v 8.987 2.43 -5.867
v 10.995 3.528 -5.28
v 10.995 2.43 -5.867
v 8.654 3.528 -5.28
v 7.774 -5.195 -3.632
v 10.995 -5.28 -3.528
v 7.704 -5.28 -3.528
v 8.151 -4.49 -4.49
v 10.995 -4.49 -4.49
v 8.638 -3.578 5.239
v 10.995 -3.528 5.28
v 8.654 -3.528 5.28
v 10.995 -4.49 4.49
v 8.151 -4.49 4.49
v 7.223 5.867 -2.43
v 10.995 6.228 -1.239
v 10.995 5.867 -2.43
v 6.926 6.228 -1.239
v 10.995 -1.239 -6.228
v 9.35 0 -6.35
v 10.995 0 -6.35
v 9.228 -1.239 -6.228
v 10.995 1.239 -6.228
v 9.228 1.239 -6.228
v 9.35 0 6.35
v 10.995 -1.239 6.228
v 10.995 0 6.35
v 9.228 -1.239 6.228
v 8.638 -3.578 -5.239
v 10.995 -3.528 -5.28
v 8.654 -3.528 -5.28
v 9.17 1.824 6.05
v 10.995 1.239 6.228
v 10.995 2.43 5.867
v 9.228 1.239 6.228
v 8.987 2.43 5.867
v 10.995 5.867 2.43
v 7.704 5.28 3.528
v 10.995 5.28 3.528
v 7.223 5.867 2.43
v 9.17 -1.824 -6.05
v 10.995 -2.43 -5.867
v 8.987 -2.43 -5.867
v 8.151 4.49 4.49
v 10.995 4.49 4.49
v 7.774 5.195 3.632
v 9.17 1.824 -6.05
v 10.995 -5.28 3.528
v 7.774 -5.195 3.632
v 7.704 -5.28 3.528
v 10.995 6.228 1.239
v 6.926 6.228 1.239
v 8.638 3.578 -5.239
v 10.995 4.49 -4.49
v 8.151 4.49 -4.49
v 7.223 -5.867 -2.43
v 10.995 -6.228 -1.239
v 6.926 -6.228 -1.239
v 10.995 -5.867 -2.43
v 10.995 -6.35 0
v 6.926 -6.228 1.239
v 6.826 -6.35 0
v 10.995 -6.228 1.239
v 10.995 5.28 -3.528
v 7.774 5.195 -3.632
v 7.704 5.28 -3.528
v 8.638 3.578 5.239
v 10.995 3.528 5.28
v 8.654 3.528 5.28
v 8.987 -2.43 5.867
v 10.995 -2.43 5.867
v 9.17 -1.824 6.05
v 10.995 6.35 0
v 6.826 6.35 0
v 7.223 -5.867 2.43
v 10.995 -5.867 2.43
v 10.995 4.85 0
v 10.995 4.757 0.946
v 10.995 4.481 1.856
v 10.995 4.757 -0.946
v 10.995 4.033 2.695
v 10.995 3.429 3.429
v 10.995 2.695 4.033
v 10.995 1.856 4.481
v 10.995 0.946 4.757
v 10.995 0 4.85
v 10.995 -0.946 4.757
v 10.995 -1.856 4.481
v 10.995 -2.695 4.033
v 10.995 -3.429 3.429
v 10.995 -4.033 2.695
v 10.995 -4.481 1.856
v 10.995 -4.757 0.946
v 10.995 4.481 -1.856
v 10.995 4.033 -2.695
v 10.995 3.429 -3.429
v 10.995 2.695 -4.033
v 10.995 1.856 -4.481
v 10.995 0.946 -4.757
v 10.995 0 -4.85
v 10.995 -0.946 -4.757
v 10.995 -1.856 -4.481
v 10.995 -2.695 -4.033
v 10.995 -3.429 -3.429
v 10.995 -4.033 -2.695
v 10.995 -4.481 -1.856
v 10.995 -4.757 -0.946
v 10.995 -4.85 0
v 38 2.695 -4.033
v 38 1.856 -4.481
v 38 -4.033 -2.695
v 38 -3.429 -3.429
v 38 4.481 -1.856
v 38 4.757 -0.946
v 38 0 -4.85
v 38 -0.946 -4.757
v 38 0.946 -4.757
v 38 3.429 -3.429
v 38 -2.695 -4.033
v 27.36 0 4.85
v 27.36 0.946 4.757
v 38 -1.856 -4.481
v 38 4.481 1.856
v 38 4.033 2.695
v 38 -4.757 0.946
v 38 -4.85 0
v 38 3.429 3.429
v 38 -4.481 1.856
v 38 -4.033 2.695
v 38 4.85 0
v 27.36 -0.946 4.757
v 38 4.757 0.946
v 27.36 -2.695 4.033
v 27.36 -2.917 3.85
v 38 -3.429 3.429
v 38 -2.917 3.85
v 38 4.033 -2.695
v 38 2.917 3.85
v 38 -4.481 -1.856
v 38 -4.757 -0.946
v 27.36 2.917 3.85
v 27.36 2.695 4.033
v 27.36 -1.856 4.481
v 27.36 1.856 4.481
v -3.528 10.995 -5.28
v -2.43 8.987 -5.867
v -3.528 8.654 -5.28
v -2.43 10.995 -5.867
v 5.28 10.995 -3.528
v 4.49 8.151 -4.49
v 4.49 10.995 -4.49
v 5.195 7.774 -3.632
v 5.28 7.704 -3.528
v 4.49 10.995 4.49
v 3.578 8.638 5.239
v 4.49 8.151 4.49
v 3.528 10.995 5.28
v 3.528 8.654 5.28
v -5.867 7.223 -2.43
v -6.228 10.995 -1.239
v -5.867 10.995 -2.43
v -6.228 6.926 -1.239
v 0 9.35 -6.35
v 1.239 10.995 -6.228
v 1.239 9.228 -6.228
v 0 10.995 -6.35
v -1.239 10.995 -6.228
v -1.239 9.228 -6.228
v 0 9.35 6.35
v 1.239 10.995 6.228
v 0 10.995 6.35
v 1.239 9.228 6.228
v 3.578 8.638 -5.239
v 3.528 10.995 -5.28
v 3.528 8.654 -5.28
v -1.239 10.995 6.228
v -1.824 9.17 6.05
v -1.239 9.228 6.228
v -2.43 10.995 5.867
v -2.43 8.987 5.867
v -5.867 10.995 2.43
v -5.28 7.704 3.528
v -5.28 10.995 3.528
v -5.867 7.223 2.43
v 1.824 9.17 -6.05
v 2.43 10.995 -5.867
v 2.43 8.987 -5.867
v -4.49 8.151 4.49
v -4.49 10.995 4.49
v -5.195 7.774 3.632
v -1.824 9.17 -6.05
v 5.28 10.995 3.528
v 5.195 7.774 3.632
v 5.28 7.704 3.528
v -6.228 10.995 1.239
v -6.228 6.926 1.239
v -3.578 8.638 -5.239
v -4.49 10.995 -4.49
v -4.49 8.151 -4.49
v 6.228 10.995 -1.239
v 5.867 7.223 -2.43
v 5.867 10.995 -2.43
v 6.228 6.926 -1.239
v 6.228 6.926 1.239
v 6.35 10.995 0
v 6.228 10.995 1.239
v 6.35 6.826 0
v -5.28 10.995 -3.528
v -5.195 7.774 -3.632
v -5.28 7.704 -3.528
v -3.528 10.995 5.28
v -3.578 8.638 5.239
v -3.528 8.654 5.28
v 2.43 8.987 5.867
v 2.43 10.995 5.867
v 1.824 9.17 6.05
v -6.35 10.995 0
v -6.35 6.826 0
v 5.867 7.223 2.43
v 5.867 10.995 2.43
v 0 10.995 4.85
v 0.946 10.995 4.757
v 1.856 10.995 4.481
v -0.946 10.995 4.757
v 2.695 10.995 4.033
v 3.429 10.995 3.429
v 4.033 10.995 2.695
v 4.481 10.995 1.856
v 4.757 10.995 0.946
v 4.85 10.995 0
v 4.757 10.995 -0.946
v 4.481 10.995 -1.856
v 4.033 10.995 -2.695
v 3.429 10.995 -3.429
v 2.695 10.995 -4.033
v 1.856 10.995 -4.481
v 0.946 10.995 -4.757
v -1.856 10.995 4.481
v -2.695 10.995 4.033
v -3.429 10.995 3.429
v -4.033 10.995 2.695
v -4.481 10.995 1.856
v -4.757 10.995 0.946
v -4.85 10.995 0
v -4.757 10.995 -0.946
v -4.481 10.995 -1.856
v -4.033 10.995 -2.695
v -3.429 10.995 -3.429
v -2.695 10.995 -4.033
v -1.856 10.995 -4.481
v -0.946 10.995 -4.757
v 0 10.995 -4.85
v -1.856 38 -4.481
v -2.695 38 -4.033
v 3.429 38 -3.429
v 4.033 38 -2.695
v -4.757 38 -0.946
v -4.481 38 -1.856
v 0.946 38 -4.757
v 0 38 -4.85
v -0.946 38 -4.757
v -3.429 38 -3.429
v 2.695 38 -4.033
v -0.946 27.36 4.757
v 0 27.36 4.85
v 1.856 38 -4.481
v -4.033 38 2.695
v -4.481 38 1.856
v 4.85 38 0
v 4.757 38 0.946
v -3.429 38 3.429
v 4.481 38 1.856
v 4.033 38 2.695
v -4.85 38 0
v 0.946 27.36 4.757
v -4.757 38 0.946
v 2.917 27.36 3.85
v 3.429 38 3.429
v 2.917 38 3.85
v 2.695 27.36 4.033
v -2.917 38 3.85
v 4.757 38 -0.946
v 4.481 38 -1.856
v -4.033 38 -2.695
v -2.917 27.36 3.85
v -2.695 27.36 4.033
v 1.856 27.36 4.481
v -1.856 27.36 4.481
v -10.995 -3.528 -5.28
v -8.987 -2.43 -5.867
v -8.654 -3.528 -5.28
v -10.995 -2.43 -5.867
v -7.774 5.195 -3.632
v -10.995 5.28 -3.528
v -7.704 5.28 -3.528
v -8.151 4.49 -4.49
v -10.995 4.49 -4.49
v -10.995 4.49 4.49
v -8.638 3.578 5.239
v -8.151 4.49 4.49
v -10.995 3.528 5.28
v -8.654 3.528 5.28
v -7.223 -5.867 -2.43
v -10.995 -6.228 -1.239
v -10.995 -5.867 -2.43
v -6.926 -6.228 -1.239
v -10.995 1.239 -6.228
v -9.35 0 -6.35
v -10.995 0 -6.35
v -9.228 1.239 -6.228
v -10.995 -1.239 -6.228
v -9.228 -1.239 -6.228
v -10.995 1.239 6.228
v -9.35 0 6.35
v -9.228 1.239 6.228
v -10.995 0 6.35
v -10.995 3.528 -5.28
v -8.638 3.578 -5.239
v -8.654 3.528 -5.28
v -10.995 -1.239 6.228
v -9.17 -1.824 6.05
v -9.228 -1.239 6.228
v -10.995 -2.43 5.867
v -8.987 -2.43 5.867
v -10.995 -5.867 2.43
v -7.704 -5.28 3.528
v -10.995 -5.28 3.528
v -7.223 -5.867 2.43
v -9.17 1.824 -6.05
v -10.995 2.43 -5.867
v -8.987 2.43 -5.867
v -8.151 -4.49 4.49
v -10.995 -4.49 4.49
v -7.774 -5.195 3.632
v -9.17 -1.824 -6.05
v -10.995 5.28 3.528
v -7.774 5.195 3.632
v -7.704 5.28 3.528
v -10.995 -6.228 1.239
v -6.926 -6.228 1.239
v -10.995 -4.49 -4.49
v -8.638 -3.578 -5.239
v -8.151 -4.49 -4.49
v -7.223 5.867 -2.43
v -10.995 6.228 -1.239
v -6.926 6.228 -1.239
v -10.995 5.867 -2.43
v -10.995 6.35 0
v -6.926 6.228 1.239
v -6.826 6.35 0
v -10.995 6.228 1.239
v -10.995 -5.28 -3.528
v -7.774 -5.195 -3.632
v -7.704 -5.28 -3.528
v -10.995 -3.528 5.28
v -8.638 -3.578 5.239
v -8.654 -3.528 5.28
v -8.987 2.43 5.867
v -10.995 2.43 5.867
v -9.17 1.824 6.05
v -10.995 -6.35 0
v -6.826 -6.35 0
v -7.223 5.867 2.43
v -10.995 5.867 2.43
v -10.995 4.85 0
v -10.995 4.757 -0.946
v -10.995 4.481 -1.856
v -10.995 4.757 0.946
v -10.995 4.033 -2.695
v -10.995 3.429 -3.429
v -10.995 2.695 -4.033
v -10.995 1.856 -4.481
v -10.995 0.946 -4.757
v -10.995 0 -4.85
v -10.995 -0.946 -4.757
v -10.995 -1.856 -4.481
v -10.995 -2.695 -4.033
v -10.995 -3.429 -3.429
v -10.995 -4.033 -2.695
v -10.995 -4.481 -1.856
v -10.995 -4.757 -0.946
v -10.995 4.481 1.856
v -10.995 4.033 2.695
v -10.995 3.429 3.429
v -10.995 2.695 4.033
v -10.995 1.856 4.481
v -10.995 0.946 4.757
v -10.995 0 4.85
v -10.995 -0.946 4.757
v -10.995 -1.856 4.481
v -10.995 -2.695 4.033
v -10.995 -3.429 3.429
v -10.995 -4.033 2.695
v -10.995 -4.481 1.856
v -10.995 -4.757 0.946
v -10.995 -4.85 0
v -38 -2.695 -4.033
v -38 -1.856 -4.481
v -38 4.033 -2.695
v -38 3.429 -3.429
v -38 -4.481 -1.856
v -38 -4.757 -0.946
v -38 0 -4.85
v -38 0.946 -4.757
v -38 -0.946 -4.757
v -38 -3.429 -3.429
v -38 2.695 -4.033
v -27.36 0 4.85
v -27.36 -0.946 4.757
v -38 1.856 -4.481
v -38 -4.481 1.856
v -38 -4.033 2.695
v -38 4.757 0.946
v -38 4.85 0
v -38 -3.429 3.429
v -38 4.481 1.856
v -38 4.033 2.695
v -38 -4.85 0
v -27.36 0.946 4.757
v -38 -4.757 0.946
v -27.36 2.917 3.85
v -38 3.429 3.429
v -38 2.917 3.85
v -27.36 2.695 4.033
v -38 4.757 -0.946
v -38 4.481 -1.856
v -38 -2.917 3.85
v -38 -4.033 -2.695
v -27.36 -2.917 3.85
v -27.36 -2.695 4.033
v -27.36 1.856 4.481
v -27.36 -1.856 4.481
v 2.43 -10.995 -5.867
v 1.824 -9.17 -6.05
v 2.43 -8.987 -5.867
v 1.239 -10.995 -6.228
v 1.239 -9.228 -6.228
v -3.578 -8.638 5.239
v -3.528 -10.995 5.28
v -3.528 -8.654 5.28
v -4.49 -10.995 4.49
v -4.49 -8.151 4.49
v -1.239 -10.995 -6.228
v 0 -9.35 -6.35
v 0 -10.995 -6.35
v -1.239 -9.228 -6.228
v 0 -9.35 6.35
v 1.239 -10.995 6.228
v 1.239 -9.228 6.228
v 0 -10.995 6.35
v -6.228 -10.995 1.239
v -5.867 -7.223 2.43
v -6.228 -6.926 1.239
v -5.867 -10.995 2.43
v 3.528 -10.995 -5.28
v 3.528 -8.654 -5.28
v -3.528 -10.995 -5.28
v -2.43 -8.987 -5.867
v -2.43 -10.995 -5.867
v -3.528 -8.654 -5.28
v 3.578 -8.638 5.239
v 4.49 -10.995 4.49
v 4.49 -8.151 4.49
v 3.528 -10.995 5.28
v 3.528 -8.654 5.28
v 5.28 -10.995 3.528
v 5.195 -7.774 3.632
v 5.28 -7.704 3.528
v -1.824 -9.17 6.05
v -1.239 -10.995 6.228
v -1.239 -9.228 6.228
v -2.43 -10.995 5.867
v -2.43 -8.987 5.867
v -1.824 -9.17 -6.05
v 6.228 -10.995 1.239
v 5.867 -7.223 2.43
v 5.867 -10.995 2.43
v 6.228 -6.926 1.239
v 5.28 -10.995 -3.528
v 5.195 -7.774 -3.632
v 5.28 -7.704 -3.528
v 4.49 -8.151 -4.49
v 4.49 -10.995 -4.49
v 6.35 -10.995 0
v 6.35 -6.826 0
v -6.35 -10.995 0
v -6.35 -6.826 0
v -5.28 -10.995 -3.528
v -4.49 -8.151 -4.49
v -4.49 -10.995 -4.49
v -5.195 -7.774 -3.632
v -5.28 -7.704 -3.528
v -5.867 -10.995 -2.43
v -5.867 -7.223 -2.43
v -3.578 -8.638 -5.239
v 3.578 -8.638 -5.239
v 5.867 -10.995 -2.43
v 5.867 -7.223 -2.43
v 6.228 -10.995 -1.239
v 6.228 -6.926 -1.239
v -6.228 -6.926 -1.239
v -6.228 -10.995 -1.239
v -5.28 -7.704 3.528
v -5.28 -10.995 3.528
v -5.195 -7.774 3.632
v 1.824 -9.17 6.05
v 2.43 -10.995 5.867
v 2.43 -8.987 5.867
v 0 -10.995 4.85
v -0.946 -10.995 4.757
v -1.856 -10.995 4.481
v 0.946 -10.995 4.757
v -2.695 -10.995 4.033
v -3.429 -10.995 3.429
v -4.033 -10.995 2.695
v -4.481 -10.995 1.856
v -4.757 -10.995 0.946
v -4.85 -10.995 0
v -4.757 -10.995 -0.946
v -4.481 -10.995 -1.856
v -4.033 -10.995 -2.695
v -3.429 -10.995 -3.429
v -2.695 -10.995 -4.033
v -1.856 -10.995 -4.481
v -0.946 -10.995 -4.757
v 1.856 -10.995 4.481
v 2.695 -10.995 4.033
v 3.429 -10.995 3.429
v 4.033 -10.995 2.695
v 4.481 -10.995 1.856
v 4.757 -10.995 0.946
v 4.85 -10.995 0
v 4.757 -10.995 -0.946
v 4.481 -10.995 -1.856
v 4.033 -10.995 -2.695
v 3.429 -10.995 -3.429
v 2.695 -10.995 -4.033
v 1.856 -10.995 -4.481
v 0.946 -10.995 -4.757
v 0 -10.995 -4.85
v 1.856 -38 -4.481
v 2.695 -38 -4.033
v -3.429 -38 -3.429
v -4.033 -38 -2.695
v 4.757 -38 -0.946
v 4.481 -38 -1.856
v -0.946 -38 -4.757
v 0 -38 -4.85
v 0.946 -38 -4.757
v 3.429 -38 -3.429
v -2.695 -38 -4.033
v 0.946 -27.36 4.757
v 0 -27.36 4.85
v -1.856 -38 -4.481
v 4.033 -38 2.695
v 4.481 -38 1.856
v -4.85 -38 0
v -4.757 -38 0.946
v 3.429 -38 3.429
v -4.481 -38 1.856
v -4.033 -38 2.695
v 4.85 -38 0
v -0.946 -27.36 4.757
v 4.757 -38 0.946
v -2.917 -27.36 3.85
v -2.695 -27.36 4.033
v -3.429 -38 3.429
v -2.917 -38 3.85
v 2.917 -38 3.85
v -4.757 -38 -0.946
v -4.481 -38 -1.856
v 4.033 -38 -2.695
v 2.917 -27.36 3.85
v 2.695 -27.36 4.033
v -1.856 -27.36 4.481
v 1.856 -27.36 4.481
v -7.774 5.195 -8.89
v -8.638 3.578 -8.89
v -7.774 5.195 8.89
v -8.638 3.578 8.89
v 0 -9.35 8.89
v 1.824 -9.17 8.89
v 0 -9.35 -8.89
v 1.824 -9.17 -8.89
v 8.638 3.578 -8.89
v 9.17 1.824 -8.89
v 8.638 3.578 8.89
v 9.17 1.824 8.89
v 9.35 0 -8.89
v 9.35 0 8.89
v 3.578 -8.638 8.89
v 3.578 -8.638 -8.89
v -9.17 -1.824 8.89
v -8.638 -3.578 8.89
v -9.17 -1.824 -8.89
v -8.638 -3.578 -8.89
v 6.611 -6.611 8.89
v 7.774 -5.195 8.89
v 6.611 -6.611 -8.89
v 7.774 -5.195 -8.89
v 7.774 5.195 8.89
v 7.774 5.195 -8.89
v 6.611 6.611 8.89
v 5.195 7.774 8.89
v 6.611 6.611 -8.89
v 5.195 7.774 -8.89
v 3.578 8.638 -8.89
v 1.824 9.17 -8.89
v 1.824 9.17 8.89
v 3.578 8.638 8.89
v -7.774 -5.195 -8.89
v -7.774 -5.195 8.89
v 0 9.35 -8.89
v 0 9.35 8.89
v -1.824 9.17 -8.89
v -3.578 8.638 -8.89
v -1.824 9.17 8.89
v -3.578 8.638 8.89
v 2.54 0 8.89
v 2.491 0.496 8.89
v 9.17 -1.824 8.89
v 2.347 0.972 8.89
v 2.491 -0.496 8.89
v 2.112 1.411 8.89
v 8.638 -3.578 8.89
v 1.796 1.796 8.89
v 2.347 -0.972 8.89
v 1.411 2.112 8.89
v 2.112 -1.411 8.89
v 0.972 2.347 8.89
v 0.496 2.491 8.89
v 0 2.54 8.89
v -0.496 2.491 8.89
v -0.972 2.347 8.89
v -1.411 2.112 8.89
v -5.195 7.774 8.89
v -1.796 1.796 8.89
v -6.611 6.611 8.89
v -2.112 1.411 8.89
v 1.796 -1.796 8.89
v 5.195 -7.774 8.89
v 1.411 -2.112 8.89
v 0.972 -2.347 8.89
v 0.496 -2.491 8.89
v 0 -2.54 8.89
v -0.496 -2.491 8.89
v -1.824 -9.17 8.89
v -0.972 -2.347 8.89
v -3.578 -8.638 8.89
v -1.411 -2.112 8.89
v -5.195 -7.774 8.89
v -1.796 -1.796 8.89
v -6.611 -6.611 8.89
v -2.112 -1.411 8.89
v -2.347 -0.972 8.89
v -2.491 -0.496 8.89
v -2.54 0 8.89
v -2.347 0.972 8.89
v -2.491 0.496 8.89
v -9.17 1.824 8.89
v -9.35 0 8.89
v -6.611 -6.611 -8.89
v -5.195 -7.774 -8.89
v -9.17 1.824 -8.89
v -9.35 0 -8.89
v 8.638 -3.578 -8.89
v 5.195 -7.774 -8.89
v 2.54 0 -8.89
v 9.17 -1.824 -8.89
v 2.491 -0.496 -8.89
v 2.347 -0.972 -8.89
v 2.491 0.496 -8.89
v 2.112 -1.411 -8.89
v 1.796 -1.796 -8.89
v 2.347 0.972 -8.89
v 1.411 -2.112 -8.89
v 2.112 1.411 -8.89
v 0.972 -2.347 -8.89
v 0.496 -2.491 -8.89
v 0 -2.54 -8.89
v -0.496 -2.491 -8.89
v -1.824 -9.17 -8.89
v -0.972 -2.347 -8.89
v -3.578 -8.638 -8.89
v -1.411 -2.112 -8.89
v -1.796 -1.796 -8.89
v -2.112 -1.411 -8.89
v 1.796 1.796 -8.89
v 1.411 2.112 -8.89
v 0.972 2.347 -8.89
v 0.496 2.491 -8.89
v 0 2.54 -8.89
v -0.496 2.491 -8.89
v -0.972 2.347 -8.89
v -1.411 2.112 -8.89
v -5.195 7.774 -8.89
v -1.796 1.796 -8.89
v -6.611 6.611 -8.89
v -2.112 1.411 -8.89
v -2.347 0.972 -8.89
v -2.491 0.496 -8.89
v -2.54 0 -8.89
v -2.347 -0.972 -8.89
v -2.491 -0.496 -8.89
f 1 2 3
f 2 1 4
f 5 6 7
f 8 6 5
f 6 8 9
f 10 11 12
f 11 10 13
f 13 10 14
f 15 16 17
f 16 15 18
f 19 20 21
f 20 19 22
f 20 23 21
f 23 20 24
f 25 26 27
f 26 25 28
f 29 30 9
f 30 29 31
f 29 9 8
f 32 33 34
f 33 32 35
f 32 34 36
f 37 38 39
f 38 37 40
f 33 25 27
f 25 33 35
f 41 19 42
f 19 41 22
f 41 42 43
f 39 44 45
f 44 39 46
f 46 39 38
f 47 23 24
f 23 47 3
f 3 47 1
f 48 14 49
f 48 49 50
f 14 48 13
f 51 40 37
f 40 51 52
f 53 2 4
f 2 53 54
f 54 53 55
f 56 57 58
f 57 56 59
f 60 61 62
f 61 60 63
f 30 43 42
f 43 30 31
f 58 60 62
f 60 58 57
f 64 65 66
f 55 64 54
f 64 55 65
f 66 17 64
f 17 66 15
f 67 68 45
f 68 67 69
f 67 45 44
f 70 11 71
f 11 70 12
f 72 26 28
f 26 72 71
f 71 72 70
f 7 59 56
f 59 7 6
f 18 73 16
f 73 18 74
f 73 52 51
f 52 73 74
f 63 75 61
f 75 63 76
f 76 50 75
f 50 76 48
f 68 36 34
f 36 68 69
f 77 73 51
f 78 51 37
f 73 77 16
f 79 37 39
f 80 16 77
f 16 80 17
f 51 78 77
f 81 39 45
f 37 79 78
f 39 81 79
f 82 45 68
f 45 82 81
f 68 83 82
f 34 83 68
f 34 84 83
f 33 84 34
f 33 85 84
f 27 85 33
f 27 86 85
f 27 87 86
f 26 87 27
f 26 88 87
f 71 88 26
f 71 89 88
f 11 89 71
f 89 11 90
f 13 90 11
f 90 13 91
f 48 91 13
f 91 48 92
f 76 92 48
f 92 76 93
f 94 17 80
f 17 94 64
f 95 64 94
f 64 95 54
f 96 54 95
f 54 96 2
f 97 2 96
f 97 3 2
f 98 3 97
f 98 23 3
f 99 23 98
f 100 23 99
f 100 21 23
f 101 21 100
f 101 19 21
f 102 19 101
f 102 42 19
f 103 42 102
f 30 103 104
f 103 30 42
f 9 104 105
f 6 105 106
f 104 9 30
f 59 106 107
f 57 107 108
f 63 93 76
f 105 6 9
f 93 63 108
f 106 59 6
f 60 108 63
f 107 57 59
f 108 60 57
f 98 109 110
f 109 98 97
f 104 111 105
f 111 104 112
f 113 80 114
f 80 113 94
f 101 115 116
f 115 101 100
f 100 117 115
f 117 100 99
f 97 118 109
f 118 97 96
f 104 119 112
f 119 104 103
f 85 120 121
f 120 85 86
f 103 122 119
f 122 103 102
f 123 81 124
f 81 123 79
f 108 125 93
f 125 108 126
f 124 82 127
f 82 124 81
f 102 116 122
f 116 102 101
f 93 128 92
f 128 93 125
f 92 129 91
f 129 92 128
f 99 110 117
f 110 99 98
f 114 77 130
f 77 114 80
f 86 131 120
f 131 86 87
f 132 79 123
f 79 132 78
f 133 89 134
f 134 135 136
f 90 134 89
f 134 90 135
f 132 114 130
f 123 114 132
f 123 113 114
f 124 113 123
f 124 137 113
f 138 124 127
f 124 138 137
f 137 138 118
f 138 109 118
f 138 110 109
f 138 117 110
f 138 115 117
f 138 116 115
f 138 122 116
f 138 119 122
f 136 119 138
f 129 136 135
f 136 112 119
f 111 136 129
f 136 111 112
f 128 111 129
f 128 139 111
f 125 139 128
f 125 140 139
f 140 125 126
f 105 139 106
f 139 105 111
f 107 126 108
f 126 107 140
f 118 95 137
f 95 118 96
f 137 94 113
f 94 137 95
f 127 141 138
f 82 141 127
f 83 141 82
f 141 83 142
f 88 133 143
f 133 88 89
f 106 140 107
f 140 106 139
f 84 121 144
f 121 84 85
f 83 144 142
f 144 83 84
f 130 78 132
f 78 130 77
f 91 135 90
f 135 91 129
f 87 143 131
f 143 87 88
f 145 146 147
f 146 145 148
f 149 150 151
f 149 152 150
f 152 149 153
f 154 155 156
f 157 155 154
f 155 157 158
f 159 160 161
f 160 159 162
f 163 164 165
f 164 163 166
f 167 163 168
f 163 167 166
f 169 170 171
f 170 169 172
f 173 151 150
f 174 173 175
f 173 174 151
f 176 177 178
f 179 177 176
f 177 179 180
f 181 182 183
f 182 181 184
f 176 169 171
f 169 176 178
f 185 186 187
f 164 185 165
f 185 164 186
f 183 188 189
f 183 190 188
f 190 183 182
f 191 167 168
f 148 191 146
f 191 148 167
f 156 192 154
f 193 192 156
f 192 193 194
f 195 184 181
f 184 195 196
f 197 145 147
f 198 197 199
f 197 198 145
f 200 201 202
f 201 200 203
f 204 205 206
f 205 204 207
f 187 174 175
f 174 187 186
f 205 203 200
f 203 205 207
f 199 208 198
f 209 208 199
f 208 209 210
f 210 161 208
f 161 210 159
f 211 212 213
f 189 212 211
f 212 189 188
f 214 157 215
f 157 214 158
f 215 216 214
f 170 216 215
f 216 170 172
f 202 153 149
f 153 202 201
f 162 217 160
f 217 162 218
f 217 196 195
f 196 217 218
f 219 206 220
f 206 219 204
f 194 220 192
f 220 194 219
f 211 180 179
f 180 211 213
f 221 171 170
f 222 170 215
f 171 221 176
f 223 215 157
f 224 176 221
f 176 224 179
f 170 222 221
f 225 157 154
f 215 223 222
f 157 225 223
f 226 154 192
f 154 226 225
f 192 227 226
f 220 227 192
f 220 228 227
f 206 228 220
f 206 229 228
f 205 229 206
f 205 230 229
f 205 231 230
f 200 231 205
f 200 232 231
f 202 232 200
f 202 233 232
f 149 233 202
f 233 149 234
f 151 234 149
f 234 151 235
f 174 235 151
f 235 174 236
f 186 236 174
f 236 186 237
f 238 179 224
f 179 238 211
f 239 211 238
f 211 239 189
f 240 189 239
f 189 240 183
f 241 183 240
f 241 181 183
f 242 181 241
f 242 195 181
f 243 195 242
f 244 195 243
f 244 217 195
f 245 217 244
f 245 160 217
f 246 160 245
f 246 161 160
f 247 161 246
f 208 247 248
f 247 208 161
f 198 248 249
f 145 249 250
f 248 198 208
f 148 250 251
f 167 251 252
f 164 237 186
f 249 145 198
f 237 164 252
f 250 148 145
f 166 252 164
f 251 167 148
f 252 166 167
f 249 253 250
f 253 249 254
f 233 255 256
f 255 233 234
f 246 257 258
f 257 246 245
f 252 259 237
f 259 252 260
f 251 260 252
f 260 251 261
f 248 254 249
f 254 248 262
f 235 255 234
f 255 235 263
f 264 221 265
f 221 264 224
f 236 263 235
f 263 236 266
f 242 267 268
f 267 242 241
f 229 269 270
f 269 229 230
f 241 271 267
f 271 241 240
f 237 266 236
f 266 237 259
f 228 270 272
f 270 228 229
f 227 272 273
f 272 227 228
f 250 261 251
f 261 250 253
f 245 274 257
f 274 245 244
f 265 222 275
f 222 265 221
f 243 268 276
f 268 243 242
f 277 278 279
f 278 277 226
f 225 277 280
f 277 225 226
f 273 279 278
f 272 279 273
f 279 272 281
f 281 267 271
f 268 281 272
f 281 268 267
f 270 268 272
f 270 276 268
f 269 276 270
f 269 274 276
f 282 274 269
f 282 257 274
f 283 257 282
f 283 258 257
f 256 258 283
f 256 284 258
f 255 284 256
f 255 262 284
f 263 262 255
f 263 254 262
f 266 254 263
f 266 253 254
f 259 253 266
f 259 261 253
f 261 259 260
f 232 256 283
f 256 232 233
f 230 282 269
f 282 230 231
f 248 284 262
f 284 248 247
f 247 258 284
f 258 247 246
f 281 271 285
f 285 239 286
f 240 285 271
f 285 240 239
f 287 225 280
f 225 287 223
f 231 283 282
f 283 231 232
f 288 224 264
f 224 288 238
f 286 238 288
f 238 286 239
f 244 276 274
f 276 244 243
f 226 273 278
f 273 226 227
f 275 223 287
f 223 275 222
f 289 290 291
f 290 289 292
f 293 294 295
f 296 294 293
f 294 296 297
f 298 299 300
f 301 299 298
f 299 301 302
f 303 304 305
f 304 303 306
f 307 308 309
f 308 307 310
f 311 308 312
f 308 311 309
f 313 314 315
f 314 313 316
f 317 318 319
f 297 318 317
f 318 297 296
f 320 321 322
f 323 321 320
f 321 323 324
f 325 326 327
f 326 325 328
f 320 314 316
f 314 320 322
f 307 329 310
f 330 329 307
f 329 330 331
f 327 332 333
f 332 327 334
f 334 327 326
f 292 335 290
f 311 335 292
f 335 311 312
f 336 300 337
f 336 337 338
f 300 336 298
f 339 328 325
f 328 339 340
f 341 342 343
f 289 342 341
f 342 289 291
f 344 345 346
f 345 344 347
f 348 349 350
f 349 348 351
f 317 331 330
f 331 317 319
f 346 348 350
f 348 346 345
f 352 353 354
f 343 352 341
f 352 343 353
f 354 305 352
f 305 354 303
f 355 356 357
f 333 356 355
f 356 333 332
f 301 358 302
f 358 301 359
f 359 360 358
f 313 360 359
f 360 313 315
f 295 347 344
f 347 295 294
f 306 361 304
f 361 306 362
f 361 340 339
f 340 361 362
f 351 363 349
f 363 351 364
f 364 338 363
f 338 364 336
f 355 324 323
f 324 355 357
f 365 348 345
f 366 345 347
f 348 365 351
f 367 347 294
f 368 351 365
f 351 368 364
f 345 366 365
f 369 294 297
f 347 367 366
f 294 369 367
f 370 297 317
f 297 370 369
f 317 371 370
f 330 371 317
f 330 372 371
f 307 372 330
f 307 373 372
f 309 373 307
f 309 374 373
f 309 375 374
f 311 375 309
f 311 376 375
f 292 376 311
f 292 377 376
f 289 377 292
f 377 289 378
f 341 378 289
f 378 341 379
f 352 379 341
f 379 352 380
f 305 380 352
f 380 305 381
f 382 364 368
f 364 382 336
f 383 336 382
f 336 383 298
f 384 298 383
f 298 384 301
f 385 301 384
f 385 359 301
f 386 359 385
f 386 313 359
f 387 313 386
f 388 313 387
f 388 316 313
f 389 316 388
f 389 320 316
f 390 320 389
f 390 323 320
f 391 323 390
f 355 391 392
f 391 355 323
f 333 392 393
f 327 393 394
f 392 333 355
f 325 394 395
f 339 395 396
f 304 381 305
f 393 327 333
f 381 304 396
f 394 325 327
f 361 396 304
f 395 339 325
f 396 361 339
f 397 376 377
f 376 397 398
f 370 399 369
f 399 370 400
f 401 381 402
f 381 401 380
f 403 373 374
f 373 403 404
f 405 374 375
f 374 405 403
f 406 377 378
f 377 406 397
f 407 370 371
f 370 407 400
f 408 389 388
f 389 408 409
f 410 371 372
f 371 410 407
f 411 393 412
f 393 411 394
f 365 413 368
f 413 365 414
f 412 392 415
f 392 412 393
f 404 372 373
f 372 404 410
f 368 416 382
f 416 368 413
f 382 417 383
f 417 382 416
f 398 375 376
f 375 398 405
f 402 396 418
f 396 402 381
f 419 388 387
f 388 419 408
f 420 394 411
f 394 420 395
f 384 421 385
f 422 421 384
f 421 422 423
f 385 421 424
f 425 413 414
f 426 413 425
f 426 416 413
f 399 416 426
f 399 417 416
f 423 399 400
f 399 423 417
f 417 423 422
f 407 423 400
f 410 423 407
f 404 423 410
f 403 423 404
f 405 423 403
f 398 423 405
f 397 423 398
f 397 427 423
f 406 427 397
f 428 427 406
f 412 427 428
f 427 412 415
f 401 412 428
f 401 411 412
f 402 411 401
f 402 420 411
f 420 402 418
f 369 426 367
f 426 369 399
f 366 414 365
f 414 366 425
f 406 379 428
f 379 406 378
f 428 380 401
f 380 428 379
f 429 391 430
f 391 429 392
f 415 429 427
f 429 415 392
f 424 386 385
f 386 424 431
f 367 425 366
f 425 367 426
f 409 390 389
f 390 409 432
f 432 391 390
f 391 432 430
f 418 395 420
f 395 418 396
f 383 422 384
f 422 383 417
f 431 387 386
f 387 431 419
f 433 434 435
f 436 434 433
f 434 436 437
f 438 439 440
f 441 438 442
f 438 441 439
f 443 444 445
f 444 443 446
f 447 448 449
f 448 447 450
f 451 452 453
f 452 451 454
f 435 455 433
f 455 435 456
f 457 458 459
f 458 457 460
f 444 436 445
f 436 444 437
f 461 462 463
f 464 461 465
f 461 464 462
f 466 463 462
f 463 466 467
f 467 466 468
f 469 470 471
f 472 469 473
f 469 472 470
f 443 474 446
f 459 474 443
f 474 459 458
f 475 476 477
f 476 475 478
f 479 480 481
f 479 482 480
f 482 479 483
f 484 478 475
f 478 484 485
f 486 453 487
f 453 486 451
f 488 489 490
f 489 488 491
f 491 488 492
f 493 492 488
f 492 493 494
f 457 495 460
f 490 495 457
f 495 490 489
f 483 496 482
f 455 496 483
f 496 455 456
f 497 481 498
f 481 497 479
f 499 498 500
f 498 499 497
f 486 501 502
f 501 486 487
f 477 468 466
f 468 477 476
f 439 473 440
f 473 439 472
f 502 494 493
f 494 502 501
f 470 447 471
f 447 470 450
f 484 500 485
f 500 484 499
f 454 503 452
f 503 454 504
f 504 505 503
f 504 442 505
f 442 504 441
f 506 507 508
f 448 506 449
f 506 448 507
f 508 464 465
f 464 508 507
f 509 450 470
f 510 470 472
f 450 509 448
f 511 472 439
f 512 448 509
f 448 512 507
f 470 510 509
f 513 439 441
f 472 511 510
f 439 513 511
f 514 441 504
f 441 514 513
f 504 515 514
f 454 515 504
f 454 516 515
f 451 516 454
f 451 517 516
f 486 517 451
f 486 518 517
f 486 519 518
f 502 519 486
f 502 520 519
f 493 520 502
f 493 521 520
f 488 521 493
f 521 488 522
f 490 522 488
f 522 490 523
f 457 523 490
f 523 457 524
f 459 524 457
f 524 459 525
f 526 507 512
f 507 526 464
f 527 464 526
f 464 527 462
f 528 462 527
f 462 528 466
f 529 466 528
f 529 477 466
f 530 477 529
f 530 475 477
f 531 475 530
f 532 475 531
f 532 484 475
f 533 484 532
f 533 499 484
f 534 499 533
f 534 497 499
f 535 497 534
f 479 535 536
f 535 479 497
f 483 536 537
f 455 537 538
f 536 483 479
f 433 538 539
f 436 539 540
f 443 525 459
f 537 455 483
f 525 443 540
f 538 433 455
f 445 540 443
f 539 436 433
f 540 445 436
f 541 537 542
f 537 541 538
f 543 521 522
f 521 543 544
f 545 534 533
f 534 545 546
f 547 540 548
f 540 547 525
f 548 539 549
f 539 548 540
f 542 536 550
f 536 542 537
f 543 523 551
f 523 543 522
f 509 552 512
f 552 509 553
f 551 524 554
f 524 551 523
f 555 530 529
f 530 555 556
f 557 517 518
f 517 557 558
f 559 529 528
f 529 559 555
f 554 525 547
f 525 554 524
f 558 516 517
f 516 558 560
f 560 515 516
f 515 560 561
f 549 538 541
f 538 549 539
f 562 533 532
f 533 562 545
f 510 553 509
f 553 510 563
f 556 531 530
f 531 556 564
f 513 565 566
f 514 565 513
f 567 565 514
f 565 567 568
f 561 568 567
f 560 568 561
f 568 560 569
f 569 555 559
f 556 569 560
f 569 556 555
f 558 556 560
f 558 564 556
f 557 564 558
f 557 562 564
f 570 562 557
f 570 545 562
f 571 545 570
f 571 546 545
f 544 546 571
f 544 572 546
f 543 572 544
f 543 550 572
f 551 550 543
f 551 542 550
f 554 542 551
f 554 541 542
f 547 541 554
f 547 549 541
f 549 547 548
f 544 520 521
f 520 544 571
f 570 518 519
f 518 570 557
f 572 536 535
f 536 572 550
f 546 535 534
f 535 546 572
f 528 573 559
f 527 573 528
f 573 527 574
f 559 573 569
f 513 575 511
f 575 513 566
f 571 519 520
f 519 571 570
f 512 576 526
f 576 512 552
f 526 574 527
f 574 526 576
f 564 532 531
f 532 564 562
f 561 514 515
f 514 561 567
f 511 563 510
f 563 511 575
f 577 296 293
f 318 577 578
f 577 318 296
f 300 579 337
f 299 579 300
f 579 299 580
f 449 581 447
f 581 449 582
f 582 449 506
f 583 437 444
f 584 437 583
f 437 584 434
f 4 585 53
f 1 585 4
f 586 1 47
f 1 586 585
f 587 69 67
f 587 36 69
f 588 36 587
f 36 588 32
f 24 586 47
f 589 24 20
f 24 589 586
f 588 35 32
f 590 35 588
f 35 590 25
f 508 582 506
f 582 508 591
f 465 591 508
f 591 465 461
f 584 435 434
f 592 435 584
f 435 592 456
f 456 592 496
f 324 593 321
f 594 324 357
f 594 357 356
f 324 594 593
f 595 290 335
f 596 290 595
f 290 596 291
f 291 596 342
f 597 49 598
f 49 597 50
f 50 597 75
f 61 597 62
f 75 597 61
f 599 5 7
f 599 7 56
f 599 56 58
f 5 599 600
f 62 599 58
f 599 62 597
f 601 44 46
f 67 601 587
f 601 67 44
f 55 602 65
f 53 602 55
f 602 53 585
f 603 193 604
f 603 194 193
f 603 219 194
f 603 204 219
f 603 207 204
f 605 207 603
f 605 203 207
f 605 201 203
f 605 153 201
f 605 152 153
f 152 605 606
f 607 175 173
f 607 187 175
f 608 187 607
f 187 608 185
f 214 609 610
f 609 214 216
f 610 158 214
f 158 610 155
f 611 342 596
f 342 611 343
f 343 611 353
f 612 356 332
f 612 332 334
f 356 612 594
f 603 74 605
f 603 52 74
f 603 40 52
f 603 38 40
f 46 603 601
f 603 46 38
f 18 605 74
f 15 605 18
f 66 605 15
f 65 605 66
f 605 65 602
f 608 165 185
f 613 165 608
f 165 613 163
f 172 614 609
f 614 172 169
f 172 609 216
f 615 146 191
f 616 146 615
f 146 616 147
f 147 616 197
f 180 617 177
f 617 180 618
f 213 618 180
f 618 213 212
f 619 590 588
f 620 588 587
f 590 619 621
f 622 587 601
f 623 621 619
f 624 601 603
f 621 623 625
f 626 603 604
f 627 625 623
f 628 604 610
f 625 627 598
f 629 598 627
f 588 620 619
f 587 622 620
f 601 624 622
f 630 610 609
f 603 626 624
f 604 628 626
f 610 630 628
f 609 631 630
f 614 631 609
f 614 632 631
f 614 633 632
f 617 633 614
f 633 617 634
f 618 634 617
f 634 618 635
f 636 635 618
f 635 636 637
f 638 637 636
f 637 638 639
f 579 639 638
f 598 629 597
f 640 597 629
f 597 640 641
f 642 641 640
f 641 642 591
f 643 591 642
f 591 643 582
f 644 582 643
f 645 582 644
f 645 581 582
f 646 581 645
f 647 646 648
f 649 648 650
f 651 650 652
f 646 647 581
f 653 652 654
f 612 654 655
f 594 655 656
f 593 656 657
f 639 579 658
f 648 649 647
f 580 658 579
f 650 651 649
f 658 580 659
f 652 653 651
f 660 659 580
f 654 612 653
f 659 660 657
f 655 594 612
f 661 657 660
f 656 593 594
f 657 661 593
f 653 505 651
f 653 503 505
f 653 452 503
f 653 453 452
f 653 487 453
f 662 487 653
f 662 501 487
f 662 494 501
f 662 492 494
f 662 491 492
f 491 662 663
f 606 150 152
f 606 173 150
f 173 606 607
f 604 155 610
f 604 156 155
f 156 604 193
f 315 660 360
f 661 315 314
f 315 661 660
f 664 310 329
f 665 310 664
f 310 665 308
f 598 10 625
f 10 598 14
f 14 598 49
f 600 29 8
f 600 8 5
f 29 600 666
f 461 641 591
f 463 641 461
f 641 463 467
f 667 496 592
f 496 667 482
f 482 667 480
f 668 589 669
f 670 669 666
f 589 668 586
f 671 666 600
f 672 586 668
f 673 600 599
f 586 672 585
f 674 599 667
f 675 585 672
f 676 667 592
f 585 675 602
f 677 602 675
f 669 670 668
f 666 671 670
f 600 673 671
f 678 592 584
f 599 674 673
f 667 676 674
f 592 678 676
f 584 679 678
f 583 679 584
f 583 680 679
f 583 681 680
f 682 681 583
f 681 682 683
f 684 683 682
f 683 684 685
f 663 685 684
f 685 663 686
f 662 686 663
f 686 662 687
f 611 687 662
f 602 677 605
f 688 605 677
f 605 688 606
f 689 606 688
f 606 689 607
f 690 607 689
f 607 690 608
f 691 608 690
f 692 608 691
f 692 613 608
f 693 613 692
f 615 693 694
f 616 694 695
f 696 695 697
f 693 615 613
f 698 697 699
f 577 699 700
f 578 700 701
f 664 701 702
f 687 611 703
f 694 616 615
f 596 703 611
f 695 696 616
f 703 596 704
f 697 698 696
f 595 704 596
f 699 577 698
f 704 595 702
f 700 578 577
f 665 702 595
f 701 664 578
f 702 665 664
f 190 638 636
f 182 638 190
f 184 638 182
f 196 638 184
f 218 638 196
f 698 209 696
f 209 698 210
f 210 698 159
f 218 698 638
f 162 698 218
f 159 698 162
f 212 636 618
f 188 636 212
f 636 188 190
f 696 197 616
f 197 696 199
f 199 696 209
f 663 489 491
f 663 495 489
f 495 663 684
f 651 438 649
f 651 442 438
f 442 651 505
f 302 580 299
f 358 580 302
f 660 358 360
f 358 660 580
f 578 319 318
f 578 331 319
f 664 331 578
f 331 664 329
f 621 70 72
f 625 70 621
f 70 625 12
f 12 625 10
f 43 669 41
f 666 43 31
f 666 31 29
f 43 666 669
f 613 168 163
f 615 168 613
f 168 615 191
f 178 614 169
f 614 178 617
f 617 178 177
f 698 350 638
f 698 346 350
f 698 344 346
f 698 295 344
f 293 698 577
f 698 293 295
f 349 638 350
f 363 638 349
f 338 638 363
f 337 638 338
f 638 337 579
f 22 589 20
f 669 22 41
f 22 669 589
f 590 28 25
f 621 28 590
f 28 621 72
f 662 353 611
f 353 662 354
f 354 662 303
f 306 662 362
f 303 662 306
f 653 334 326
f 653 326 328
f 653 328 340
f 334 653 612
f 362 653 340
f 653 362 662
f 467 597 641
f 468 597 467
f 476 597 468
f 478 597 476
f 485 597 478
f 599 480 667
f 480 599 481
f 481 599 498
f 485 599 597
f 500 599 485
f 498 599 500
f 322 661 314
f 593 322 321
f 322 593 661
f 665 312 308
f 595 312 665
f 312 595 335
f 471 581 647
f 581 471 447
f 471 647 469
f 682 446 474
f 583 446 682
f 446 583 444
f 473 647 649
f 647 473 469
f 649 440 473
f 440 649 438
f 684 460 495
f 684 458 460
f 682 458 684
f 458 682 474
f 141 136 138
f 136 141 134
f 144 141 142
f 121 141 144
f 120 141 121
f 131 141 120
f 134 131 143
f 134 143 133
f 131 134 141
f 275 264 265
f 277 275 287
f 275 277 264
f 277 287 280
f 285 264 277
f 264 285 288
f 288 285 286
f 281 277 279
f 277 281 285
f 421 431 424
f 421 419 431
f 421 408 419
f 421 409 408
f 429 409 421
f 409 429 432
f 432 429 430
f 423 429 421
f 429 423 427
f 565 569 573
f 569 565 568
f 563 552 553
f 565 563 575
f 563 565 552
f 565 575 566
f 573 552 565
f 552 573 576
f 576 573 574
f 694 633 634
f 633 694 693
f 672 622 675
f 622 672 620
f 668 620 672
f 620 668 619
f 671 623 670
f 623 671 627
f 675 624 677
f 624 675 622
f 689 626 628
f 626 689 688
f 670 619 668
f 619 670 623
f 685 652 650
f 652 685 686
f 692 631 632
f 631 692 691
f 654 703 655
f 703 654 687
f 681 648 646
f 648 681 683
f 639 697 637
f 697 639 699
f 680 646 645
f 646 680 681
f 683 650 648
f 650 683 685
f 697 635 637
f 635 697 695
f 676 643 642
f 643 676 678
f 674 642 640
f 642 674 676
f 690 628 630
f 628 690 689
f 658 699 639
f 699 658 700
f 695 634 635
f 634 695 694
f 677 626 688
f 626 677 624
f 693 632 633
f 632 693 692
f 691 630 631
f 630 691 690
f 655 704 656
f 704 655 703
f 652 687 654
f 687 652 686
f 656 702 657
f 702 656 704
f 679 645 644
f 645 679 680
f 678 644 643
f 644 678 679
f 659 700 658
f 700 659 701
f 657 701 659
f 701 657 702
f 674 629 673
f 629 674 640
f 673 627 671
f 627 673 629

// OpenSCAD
$fn = 32;

// ----------------------------------------------------------------------
// Cardan cross: 76 mm span, 12.7 mm trunnions
// ----------------------------------------------------------------------

// --- parameters (mm) ---
journal_d = 12.7;         // trunnion diameter
arm_len = 38;             // trunnion length from the centre
step_r = 4.32;            // step position from the centre
step_d = 9.7;             // journal diameter after the step
hub_d = 18.7;             // hub diameter
hub_h = 17.78;            // hub height
bore_d = 5.08;            // hub bore
flat_d = 1;               // depth of the journal flat
flat_len = 10.64;         // length of the journal flat

difference() {
  union() {
    /* hub along the joint axis */
    cylinder(h = hub_h, d = hub_d, center = true);
    for (a = [0 : 90 : 270]) rotate([0, 0, a]) {
      /* trunnion, sunk into the hub */
      translate([hub_d / 4, 0, 0]) rotate([0, 90, 0]) cylinder(h = step_r + 2, d = journal_d);
      /* stepped journal out to the tip */
      translate([step_r - 0.5, 0, 0]) rotate([0, 90, 0]) cylinder(h = arm_len + 0.5 - step_r, d = step_d);
    }
  }
  /* lubrication bore through the hub, 2.5 mm clear on both sides */
  translate([0, 0, -hub_h / 2 - 2.5]) cylinder(h = hub_h + 5, d = bore_d);
  /* machined flat on each journal tip */
  for (a = [0 : 90 : 270]) rotate([0, 0, a]) {
    translate([arm_len - flat_len, -step_d, step_d / 2 - flat_d]) cube([flat_len + 0.5, 2 * step_d, flat_d + 2.5]);
  }
}
